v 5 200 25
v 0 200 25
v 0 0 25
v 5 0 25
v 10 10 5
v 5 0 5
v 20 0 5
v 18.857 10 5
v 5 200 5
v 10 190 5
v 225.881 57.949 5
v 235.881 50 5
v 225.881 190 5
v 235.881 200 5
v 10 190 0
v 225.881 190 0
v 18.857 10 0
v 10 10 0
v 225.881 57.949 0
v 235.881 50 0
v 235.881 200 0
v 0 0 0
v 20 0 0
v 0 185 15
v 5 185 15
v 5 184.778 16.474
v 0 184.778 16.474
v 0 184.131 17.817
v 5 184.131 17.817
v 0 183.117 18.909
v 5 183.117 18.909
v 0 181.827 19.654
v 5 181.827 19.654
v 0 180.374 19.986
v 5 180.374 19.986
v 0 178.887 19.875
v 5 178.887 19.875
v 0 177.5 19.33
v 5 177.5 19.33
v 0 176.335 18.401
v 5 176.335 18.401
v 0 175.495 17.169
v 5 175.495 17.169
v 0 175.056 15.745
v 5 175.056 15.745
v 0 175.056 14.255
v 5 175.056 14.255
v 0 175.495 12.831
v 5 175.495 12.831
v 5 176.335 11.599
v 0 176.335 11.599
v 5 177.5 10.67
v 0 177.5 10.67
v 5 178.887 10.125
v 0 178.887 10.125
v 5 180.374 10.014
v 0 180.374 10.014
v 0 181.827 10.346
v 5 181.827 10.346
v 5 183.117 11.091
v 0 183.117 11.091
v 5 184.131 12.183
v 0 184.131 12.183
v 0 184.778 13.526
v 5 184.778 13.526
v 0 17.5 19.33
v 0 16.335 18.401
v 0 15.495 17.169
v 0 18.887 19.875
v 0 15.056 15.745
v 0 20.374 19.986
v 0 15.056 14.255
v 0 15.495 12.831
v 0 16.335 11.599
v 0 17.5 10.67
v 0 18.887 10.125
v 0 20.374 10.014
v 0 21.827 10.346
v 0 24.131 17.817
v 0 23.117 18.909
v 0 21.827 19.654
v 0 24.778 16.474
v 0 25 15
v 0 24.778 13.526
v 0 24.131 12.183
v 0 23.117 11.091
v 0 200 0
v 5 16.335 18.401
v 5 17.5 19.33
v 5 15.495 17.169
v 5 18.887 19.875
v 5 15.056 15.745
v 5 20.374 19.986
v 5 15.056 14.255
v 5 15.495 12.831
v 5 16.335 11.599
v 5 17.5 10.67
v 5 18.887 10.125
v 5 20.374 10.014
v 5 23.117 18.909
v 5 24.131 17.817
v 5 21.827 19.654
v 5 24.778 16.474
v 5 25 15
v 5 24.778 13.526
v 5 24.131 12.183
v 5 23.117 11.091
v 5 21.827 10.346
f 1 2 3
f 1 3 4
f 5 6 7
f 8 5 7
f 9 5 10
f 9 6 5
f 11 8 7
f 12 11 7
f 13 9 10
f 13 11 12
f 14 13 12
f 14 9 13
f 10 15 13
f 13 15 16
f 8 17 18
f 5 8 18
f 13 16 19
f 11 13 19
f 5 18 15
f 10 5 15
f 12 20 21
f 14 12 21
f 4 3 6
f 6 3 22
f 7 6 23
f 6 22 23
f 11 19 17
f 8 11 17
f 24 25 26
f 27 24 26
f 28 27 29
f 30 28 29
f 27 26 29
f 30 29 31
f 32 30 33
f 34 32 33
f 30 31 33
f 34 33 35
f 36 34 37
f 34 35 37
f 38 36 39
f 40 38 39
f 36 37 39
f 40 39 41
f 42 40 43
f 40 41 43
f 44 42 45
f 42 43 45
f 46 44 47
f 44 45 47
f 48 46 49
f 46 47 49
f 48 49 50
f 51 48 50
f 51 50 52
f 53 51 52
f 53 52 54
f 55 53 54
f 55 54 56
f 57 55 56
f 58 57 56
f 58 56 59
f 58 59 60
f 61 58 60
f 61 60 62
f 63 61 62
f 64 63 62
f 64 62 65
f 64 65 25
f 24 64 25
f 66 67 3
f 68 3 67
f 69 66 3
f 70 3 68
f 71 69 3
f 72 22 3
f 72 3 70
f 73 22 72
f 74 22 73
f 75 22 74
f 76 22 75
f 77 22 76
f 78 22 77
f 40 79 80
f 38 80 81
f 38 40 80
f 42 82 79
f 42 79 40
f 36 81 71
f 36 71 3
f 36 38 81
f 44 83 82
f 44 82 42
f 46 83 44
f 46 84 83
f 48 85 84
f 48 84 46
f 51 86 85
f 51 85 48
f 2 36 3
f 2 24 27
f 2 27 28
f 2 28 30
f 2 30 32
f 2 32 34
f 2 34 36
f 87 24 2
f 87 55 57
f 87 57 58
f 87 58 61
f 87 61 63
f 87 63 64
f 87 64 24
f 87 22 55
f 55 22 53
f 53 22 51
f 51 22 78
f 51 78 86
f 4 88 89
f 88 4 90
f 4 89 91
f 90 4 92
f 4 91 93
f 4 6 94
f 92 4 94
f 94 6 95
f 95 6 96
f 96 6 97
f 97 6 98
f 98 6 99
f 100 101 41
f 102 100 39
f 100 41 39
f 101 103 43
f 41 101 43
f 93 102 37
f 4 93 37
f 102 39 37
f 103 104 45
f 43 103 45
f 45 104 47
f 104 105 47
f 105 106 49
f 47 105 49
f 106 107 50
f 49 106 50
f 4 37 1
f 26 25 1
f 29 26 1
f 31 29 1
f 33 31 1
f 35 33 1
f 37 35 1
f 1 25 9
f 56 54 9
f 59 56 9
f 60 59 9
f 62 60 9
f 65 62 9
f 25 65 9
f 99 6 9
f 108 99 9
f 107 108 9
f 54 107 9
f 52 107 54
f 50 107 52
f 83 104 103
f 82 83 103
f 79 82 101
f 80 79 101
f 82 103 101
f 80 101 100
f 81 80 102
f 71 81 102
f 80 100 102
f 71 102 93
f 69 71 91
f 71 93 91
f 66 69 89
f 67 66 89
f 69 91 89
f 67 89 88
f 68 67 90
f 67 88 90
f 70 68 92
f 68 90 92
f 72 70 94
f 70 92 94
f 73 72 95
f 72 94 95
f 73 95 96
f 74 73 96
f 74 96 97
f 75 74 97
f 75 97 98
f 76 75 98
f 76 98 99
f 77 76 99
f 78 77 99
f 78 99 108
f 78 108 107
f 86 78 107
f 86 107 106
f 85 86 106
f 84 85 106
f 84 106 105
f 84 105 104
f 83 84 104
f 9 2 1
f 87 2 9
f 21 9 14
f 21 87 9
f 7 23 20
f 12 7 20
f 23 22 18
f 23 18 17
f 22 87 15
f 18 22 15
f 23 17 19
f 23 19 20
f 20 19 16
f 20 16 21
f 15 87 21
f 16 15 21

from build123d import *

# Parameters (mm, degrees)
BOSS_EXTRUDE1_DEPTH = 5
SKETCH2_W           = 5
SKETCH2_H           = 200
BOSS_EXTRUDE2_DEPTH = 20
SKETCH3_R           = 5
CUT_EXTRUDE1_DEPTH  = 307.481412279


with BuildPart() as part:
    # Sketch1 → Boss-Extrude1 (new body)
    with BuildSketch(Plane.XY):
        Polygon((0, 0), (20, 0), (235.880609996, 50), (235.880609996, 200), (0, 200), align=None)
        Polygon((10, 190), (225.880609996, 190), (225.880609996, 57.948616206), (18.857079694, 10), (10, 10), align=None, mode=Mode.SUBTRACT)
    extrude(amount=BOSS_EXTRUDE1_DEPTH)

    # Sketch2 → Boss-Extrude2 (add)
    with BuildSketch(Plane.XY.offset(5)):
        with Locations((2.5, 100)):
            Rectangle(SKETCH2_W, SKETCH2_H)
    extrude(amount=BOSS_EXTRUDE2_DEPTH)

    # Sketch3 → Cut-Extrude1 (cut, through all)
    with BuildSketch(Plane(origin=(5, 0, 0), x_dir=(0, 0, -1), z_dir=(1, 0, 0))):
        with Locations(Location((-15, 180, 0), (0, 0, 90))):
            Circle(SKETCH3_R)
        with Locations(Location((-15, 20, 0), (0, 0, 90))):
            Circle(SKETCH3_R)
    extrude(amount=-CUT_EXTRUDE1_DEPTH, mode=Mode.SUBTRACT)


solid = part.part
